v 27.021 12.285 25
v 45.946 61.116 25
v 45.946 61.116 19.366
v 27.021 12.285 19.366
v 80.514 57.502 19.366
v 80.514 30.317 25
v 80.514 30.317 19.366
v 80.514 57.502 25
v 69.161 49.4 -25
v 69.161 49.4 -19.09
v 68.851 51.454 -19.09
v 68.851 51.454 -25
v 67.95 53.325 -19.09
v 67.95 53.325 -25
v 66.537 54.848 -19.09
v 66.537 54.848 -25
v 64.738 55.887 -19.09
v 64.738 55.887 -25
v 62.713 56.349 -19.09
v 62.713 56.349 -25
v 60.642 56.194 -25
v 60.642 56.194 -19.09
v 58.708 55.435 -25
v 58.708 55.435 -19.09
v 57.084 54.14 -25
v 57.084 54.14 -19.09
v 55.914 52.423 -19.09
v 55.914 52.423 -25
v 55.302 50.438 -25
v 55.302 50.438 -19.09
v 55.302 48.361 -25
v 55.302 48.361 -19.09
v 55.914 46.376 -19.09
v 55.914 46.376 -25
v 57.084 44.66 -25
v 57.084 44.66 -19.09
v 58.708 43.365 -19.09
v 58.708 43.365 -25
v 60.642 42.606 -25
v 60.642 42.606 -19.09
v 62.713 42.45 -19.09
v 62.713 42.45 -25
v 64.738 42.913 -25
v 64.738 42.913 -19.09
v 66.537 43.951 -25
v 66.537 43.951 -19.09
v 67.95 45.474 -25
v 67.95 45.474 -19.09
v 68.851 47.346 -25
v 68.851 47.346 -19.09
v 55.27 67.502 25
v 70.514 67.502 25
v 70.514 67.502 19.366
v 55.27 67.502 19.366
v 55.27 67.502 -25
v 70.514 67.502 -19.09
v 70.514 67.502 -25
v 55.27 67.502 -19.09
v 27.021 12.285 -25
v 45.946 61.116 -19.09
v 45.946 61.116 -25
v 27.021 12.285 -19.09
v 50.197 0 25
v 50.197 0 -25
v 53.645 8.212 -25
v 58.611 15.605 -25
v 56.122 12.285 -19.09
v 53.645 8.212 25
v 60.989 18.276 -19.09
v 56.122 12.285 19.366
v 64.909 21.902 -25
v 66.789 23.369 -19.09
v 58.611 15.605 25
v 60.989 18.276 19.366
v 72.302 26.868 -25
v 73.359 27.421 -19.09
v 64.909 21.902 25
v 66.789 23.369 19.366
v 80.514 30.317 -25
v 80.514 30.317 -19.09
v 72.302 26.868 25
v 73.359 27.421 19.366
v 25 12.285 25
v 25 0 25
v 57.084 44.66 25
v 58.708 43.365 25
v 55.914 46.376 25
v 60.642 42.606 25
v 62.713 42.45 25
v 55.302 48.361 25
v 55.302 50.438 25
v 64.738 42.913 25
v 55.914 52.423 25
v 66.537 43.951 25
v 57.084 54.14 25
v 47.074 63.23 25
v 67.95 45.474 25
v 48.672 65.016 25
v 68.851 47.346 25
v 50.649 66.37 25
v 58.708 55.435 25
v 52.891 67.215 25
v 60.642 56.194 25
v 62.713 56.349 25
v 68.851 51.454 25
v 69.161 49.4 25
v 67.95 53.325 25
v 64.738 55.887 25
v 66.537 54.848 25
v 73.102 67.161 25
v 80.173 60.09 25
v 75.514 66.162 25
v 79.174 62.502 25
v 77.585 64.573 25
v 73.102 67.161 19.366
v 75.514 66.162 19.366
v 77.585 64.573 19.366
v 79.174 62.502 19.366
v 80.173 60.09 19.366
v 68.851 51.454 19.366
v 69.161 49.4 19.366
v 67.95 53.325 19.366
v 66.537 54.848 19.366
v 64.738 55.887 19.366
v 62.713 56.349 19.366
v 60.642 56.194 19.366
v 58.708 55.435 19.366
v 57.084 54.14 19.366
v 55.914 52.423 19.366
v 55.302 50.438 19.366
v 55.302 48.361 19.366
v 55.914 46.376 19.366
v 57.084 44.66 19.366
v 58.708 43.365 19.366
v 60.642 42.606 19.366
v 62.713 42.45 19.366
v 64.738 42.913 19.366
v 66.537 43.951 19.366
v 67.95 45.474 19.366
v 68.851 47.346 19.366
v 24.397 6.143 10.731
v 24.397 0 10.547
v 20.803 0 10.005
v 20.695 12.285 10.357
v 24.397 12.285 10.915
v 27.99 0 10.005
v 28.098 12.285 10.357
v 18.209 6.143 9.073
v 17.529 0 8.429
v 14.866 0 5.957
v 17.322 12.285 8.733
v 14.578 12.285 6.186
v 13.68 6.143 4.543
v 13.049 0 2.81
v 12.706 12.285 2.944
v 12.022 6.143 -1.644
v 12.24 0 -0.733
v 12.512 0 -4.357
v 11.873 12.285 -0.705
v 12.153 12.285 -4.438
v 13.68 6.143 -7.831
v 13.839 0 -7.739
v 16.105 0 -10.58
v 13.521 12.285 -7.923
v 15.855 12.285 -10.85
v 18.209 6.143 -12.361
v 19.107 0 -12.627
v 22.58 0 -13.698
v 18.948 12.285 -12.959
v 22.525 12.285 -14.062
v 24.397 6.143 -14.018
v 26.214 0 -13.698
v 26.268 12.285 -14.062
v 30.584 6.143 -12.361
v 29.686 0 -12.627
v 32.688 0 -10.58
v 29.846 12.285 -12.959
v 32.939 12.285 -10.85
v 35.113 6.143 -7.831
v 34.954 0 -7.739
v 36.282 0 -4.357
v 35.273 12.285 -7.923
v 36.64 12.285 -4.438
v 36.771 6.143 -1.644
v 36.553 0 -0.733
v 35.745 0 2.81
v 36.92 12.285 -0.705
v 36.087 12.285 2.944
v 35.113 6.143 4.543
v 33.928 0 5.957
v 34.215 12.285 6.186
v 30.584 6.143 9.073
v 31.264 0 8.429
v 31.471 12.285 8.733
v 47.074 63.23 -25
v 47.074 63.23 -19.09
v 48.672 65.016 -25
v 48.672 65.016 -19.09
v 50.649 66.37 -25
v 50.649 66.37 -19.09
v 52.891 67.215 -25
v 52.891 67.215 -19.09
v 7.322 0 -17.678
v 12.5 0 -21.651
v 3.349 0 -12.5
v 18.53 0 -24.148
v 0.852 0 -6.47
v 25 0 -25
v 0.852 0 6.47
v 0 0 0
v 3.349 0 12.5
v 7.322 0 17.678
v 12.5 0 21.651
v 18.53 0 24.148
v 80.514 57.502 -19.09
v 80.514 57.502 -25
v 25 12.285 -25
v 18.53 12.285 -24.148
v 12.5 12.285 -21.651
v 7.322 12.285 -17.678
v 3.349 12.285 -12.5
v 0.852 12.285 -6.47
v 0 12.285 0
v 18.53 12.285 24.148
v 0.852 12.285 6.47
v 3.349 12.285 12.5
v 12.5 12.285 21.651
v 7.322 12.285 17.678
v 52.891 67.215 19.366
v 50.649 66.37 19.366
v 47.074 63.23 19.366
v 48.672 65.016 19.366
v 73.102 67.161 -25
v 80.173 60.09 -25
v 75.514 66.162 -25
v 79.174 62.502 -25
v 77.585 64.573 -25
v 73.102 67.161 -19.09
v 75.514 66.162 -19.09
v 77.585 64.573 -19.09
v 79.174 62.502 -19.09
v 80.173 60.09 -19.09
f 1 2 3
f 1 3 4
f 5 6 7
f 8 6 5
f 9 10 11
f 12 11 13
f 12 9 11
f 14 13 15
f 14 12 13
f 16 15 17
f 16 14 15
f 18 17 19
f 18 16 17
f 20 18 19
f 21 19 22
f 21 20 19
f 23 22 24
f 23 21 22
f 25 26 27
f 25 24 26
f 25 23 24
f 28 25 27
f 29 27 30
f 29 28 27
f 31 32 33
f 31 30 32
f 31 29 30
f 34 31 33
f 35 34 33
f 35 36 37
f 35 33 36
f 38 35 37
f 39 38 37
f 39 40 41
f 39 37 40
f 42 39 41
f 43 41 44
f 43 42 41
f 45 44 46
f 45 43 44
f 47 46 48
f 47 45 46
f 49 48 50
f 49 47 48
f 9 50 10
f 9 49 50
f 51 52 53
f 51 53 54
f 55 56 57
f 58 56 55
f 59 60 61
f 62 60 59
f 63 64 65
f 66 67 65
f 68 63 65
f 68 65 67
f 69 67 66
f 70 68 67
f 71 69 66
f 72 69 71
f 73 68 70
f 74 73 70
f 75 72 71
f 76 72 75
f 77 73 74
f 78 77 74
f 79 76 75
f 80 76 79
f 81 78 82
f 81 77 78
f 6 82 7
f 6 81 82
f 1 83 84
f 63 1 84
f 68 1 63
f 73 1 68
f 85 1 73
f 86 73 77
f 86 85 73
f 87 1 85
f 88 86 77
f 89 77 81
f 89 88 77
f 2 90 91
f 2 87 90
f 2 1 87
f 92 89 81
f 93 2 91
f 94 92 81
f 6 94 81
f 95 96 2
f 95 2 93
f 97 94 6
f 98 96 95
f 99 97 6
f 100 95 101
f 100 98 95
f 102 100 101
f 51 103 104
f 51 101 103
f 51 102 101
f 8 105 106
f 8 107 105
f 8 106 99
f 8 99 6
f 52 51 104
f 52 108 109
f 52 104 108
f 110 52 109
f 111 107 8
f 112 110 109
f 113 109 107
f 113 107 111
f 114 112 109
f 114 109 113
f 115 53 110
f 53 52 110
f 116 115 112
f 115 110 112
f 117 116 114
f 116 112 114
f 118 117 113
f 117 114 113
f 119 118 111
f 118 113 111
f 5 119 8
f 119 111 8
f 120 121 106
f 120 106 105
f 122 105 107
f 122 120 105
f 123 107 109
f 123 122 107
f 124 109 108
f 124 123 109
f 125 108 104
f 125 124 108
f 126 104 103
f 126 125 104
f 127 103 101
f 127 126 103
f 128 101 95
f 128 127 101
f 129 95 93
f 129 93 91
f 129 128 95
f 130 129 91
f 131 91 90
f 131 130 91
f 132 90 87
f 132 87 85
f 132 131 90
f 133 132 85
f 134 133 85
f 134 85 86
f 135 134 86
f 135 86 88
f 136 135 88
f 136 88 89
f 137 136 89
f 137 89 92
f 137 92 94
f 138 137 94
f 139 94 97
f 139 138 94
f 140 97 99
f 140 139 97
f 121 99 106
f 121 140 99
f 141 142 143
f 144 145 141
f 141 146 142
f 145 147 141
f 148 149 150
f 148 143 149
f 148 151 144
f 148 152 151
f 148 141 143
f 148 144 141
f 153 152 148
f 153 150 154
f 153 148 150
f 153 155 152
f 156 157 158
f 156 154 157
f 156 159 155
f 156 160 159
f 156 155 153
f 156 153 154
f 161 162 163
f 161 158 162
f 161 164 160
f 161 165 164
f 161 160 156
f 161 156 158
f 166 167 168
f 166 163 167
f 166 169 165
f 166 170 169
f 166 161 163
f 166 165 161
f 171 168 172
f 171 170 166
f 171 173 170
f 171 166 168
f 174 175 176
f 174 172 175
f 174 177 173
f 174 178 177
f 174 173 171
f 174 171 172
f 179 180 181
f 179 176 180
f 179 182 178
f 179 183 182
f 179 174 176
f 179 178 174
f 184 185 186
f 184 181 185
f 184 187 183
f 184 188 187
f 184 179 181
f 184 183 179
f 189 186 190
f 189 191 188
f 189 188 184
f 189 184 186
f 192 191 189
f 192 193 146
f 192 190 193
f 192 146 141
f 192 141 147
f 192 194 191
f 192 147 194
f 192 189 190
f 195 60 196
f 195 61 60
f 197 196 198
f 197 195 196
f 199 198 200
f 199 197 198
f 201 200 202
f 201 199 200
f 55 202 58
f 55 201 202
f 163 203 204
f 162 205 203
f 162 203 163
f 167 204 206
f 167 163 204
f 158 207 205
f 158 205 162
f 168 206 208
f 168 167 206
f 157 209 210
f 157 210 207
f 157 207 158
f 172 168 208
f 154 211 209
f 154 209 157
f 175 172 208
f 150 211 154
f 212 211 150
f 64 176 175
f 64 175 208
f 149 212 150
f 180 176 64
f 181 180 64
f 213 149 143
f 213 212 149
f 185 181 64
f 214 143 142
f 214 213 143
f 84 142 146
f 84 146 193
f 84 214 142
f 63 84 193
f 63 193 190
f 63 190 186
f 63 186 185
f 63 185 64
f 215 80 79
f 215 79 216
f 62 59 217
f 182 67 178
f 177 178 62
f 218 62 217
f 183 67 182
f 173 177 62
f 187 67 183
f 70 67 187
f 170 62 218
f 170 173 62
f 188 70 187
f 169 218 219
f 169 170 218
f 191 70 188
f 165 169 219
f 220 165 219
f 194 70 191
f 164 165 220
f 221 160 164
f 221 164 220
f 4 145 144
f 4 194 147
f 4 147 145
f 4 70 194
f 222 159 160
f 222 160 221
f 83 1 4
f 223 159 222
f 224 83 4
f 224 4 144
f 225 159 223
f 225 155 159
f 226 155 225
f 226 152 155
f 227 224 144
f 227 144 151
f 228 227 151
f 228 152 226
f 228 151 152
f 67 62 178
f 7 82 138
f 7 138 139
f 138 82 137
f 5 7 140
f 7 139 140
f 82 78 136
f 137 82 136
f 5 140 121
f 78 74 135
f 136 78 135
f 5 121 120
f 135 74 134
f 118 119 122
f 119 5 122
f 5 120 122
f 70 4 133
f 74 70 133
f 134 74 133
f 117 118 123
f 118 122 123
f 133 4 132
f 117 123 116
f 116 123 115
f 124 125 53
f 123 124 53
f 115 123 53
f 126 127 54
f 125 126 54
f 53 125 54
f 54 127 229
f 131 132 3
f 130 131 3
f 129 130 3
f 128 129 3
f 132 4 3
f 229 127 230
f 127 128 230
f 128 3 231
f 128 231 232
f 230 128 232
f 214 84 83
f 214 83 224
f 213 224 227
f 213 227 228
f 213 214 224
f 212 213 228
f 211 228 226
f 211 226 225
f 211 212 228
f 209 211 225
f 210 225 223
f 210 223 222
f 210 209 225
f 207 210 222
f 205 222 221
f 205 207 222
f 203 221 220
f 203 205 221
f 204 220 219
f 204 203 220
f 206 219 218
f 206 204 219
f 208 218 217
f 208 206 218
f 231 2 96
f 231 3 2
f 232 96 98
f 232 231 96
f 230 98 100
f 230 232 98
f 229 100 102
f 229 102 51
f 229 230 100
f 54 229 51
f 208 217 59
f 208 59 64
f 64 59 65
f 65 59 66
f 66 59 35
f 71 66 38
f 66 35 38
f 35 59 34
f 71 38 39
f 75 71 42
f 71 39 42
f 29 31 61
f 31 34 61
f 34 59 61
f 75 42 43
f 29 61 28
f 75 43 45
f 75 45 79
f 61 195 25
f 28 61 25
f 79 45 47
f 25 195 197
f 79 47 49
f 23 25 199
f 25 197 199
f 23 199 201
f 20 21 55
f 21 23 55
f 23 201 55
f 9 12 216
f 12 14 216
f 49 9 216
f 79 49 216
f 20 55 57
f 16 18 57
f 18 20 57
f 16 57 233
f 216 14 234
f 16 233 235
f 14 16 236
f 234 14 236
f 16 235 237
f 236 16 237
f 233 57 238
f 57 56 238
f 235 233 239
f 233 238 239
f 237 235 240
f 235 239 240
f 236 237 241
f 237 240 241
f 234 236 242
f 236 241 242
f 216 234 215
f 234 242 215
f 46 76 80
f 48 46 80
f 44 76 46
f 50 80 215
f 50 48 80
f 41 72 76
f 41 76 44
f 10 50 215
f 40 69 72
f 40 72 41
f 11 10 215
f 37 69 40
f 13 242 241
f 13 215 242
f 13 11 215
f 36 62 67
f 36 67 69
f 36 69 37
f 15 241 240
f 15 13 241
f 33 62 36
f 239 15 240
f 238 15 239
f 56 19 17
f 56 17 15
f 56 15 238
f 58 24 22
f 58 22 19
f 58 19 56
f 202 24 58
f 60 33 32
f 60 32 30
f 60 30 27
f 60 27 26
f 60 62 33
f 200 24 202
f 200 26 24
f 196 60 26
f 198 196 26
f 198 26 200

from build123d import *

# Parameters (mm, degrees)
SKETCH2_R           = 6.96865511
BOSS_EXTRUDE1_DEPTH = 25
SKETCH3_W           = 38.455930717
SKETCH3_H           = 55.217032342
CUT_EXTRUDE1_DEPTH  = 109.000086758
FILLET1_RADIUS      = 25
FILLET1_LENGTH      = 12.285129205
FILLET2_R           = 10
FILLET3_R           = 10
FILLET4_R           = 10
FILLET5_R           = 10


with BuildPart() as part:
    # Sketch2 → Boss-Extrude1 (new, symmetric)
    with BuildSketch(Plane.XY):
        with BuildLine():
            Line((0, 0), (50.197302129, 0))
            ThreePointArc((50.197302129, 0), (61.607367951, 18.906462701), (80.513830652, 30.316528523))
            Line((80.513830652, 30.316528523), (80.513830652, 67.502161547))
            Line((80.513830652, 67.502161547), (48.421245481, 67.502161547))
            Line((48.421245481, 67.502161547), (27.021342994, 12.285129205))
            Line((27.021342994, 12.285129205), (0, 12.285129205))
            Line((0, 12.285129205), (0, 0))
        make_face()
        with Locations((62.192399066, 49.399617147)):
            Circle(SKETCH2_R, mode=Mode.SUBTRACT)
    extrude(amount=BOSS_EXTRUDE1_DEPTH, both=True)

    # Sketch3 → Cut-Extrude1 (cut, through all)
    with BuildSketch(Plane(origin=(0, 0, 0), x_dir=(0, 0, -1), z_dir=(1, 0, 0))):
        with Locations((-0.137670396, 39.893645376)):
            Rectangle(SKETCH3_W, SKETCH3_H)
    extrude(amount=CUT_EXTRUDE1_DEPTH, mode=Mode.SUBTRACT)

    # Fillet1: full round fillet: the end face becomes a half cylinder, R = half its width
    fillet1_face = Plane((0, 6.142564603, 0), x_dir=(0, -1, 0), z_dir=(-1, 0, 0))  # on the end face: x along it, z out of the body
    fillet1_slab = fillet1_face.offset(-FILLET1_RADIUS / 2) * Box(FILLET1_LENGTH, 2 * FILLET1_RADIUS, FILLET1_RADIUS, mode=Mode.PRIVATE)  # the body's end, R deep
    fillet1_round = Plane((25, 6.142564603, 0), x_dir=(-1, 0, 0), z_dir=(0, -1, 0)) * Cylinder(FILLET1_RADIUS, FILLET1_LENGTH, mode=Mode.PRIVATE)  # its axis R under the face
    add(fillet1_slab - fillet1_round, mode=Mode.SUBTRACT)

    # Fillet2
    fillet2_edges = [part.edges().sort_by_distance(p)[0] for p in [
        (48.421245481, 67.502161547, -22.045147481),
    ]]
    fillet(fillet2_edges, radius=FILLET2_R)

    # Fillet3
    fillet3_edges = [part.edges().sort_by_distance(p)[0] for p in [
        (80.513830652, 67.502161547, -22.045147481),
    ]]
    fillet(fillet3_edges, radius=FILLET3_R)

    # Fillet4
    fillet4_edges = [part.edges().sort_by_distance(p)[0] for p in [
        (48.421245481, 67.502161547, 22.182817878),
    ]]
    fillet(fillet4_edges, radius=FILLET4_R)

    # Fillet5
    fillet5_edges = [part.edges().sort_by_distance(p)[0] for p in [
        (80.513830652, 67.502161547, 22.182817878),
    ]]
    fillet(fillet5_edges, radius=FILLET5_R)

    # Sketch6 → 3/4 NPT Tapped Hole1 (revolve, cut)
    with BuildSketch(Plane(origin=(24.396705522, 12.285129205, -1.643830205), x_dir=(0, 0, 1), z_dir=(1, 0, 0))):
        Polygon((0, 0), (0, 12.285129205), (11.5062, 12.285129205), (11.5062, 14.05), (12.137858885, 14.05), (12.5585347, 0), align=None)
    revolve(axis=Axis((24.396705522, 18.635129205, -1.643830205), (0, -1, 0)), mode=Mode.SUBTRACT)


solid = part.part
